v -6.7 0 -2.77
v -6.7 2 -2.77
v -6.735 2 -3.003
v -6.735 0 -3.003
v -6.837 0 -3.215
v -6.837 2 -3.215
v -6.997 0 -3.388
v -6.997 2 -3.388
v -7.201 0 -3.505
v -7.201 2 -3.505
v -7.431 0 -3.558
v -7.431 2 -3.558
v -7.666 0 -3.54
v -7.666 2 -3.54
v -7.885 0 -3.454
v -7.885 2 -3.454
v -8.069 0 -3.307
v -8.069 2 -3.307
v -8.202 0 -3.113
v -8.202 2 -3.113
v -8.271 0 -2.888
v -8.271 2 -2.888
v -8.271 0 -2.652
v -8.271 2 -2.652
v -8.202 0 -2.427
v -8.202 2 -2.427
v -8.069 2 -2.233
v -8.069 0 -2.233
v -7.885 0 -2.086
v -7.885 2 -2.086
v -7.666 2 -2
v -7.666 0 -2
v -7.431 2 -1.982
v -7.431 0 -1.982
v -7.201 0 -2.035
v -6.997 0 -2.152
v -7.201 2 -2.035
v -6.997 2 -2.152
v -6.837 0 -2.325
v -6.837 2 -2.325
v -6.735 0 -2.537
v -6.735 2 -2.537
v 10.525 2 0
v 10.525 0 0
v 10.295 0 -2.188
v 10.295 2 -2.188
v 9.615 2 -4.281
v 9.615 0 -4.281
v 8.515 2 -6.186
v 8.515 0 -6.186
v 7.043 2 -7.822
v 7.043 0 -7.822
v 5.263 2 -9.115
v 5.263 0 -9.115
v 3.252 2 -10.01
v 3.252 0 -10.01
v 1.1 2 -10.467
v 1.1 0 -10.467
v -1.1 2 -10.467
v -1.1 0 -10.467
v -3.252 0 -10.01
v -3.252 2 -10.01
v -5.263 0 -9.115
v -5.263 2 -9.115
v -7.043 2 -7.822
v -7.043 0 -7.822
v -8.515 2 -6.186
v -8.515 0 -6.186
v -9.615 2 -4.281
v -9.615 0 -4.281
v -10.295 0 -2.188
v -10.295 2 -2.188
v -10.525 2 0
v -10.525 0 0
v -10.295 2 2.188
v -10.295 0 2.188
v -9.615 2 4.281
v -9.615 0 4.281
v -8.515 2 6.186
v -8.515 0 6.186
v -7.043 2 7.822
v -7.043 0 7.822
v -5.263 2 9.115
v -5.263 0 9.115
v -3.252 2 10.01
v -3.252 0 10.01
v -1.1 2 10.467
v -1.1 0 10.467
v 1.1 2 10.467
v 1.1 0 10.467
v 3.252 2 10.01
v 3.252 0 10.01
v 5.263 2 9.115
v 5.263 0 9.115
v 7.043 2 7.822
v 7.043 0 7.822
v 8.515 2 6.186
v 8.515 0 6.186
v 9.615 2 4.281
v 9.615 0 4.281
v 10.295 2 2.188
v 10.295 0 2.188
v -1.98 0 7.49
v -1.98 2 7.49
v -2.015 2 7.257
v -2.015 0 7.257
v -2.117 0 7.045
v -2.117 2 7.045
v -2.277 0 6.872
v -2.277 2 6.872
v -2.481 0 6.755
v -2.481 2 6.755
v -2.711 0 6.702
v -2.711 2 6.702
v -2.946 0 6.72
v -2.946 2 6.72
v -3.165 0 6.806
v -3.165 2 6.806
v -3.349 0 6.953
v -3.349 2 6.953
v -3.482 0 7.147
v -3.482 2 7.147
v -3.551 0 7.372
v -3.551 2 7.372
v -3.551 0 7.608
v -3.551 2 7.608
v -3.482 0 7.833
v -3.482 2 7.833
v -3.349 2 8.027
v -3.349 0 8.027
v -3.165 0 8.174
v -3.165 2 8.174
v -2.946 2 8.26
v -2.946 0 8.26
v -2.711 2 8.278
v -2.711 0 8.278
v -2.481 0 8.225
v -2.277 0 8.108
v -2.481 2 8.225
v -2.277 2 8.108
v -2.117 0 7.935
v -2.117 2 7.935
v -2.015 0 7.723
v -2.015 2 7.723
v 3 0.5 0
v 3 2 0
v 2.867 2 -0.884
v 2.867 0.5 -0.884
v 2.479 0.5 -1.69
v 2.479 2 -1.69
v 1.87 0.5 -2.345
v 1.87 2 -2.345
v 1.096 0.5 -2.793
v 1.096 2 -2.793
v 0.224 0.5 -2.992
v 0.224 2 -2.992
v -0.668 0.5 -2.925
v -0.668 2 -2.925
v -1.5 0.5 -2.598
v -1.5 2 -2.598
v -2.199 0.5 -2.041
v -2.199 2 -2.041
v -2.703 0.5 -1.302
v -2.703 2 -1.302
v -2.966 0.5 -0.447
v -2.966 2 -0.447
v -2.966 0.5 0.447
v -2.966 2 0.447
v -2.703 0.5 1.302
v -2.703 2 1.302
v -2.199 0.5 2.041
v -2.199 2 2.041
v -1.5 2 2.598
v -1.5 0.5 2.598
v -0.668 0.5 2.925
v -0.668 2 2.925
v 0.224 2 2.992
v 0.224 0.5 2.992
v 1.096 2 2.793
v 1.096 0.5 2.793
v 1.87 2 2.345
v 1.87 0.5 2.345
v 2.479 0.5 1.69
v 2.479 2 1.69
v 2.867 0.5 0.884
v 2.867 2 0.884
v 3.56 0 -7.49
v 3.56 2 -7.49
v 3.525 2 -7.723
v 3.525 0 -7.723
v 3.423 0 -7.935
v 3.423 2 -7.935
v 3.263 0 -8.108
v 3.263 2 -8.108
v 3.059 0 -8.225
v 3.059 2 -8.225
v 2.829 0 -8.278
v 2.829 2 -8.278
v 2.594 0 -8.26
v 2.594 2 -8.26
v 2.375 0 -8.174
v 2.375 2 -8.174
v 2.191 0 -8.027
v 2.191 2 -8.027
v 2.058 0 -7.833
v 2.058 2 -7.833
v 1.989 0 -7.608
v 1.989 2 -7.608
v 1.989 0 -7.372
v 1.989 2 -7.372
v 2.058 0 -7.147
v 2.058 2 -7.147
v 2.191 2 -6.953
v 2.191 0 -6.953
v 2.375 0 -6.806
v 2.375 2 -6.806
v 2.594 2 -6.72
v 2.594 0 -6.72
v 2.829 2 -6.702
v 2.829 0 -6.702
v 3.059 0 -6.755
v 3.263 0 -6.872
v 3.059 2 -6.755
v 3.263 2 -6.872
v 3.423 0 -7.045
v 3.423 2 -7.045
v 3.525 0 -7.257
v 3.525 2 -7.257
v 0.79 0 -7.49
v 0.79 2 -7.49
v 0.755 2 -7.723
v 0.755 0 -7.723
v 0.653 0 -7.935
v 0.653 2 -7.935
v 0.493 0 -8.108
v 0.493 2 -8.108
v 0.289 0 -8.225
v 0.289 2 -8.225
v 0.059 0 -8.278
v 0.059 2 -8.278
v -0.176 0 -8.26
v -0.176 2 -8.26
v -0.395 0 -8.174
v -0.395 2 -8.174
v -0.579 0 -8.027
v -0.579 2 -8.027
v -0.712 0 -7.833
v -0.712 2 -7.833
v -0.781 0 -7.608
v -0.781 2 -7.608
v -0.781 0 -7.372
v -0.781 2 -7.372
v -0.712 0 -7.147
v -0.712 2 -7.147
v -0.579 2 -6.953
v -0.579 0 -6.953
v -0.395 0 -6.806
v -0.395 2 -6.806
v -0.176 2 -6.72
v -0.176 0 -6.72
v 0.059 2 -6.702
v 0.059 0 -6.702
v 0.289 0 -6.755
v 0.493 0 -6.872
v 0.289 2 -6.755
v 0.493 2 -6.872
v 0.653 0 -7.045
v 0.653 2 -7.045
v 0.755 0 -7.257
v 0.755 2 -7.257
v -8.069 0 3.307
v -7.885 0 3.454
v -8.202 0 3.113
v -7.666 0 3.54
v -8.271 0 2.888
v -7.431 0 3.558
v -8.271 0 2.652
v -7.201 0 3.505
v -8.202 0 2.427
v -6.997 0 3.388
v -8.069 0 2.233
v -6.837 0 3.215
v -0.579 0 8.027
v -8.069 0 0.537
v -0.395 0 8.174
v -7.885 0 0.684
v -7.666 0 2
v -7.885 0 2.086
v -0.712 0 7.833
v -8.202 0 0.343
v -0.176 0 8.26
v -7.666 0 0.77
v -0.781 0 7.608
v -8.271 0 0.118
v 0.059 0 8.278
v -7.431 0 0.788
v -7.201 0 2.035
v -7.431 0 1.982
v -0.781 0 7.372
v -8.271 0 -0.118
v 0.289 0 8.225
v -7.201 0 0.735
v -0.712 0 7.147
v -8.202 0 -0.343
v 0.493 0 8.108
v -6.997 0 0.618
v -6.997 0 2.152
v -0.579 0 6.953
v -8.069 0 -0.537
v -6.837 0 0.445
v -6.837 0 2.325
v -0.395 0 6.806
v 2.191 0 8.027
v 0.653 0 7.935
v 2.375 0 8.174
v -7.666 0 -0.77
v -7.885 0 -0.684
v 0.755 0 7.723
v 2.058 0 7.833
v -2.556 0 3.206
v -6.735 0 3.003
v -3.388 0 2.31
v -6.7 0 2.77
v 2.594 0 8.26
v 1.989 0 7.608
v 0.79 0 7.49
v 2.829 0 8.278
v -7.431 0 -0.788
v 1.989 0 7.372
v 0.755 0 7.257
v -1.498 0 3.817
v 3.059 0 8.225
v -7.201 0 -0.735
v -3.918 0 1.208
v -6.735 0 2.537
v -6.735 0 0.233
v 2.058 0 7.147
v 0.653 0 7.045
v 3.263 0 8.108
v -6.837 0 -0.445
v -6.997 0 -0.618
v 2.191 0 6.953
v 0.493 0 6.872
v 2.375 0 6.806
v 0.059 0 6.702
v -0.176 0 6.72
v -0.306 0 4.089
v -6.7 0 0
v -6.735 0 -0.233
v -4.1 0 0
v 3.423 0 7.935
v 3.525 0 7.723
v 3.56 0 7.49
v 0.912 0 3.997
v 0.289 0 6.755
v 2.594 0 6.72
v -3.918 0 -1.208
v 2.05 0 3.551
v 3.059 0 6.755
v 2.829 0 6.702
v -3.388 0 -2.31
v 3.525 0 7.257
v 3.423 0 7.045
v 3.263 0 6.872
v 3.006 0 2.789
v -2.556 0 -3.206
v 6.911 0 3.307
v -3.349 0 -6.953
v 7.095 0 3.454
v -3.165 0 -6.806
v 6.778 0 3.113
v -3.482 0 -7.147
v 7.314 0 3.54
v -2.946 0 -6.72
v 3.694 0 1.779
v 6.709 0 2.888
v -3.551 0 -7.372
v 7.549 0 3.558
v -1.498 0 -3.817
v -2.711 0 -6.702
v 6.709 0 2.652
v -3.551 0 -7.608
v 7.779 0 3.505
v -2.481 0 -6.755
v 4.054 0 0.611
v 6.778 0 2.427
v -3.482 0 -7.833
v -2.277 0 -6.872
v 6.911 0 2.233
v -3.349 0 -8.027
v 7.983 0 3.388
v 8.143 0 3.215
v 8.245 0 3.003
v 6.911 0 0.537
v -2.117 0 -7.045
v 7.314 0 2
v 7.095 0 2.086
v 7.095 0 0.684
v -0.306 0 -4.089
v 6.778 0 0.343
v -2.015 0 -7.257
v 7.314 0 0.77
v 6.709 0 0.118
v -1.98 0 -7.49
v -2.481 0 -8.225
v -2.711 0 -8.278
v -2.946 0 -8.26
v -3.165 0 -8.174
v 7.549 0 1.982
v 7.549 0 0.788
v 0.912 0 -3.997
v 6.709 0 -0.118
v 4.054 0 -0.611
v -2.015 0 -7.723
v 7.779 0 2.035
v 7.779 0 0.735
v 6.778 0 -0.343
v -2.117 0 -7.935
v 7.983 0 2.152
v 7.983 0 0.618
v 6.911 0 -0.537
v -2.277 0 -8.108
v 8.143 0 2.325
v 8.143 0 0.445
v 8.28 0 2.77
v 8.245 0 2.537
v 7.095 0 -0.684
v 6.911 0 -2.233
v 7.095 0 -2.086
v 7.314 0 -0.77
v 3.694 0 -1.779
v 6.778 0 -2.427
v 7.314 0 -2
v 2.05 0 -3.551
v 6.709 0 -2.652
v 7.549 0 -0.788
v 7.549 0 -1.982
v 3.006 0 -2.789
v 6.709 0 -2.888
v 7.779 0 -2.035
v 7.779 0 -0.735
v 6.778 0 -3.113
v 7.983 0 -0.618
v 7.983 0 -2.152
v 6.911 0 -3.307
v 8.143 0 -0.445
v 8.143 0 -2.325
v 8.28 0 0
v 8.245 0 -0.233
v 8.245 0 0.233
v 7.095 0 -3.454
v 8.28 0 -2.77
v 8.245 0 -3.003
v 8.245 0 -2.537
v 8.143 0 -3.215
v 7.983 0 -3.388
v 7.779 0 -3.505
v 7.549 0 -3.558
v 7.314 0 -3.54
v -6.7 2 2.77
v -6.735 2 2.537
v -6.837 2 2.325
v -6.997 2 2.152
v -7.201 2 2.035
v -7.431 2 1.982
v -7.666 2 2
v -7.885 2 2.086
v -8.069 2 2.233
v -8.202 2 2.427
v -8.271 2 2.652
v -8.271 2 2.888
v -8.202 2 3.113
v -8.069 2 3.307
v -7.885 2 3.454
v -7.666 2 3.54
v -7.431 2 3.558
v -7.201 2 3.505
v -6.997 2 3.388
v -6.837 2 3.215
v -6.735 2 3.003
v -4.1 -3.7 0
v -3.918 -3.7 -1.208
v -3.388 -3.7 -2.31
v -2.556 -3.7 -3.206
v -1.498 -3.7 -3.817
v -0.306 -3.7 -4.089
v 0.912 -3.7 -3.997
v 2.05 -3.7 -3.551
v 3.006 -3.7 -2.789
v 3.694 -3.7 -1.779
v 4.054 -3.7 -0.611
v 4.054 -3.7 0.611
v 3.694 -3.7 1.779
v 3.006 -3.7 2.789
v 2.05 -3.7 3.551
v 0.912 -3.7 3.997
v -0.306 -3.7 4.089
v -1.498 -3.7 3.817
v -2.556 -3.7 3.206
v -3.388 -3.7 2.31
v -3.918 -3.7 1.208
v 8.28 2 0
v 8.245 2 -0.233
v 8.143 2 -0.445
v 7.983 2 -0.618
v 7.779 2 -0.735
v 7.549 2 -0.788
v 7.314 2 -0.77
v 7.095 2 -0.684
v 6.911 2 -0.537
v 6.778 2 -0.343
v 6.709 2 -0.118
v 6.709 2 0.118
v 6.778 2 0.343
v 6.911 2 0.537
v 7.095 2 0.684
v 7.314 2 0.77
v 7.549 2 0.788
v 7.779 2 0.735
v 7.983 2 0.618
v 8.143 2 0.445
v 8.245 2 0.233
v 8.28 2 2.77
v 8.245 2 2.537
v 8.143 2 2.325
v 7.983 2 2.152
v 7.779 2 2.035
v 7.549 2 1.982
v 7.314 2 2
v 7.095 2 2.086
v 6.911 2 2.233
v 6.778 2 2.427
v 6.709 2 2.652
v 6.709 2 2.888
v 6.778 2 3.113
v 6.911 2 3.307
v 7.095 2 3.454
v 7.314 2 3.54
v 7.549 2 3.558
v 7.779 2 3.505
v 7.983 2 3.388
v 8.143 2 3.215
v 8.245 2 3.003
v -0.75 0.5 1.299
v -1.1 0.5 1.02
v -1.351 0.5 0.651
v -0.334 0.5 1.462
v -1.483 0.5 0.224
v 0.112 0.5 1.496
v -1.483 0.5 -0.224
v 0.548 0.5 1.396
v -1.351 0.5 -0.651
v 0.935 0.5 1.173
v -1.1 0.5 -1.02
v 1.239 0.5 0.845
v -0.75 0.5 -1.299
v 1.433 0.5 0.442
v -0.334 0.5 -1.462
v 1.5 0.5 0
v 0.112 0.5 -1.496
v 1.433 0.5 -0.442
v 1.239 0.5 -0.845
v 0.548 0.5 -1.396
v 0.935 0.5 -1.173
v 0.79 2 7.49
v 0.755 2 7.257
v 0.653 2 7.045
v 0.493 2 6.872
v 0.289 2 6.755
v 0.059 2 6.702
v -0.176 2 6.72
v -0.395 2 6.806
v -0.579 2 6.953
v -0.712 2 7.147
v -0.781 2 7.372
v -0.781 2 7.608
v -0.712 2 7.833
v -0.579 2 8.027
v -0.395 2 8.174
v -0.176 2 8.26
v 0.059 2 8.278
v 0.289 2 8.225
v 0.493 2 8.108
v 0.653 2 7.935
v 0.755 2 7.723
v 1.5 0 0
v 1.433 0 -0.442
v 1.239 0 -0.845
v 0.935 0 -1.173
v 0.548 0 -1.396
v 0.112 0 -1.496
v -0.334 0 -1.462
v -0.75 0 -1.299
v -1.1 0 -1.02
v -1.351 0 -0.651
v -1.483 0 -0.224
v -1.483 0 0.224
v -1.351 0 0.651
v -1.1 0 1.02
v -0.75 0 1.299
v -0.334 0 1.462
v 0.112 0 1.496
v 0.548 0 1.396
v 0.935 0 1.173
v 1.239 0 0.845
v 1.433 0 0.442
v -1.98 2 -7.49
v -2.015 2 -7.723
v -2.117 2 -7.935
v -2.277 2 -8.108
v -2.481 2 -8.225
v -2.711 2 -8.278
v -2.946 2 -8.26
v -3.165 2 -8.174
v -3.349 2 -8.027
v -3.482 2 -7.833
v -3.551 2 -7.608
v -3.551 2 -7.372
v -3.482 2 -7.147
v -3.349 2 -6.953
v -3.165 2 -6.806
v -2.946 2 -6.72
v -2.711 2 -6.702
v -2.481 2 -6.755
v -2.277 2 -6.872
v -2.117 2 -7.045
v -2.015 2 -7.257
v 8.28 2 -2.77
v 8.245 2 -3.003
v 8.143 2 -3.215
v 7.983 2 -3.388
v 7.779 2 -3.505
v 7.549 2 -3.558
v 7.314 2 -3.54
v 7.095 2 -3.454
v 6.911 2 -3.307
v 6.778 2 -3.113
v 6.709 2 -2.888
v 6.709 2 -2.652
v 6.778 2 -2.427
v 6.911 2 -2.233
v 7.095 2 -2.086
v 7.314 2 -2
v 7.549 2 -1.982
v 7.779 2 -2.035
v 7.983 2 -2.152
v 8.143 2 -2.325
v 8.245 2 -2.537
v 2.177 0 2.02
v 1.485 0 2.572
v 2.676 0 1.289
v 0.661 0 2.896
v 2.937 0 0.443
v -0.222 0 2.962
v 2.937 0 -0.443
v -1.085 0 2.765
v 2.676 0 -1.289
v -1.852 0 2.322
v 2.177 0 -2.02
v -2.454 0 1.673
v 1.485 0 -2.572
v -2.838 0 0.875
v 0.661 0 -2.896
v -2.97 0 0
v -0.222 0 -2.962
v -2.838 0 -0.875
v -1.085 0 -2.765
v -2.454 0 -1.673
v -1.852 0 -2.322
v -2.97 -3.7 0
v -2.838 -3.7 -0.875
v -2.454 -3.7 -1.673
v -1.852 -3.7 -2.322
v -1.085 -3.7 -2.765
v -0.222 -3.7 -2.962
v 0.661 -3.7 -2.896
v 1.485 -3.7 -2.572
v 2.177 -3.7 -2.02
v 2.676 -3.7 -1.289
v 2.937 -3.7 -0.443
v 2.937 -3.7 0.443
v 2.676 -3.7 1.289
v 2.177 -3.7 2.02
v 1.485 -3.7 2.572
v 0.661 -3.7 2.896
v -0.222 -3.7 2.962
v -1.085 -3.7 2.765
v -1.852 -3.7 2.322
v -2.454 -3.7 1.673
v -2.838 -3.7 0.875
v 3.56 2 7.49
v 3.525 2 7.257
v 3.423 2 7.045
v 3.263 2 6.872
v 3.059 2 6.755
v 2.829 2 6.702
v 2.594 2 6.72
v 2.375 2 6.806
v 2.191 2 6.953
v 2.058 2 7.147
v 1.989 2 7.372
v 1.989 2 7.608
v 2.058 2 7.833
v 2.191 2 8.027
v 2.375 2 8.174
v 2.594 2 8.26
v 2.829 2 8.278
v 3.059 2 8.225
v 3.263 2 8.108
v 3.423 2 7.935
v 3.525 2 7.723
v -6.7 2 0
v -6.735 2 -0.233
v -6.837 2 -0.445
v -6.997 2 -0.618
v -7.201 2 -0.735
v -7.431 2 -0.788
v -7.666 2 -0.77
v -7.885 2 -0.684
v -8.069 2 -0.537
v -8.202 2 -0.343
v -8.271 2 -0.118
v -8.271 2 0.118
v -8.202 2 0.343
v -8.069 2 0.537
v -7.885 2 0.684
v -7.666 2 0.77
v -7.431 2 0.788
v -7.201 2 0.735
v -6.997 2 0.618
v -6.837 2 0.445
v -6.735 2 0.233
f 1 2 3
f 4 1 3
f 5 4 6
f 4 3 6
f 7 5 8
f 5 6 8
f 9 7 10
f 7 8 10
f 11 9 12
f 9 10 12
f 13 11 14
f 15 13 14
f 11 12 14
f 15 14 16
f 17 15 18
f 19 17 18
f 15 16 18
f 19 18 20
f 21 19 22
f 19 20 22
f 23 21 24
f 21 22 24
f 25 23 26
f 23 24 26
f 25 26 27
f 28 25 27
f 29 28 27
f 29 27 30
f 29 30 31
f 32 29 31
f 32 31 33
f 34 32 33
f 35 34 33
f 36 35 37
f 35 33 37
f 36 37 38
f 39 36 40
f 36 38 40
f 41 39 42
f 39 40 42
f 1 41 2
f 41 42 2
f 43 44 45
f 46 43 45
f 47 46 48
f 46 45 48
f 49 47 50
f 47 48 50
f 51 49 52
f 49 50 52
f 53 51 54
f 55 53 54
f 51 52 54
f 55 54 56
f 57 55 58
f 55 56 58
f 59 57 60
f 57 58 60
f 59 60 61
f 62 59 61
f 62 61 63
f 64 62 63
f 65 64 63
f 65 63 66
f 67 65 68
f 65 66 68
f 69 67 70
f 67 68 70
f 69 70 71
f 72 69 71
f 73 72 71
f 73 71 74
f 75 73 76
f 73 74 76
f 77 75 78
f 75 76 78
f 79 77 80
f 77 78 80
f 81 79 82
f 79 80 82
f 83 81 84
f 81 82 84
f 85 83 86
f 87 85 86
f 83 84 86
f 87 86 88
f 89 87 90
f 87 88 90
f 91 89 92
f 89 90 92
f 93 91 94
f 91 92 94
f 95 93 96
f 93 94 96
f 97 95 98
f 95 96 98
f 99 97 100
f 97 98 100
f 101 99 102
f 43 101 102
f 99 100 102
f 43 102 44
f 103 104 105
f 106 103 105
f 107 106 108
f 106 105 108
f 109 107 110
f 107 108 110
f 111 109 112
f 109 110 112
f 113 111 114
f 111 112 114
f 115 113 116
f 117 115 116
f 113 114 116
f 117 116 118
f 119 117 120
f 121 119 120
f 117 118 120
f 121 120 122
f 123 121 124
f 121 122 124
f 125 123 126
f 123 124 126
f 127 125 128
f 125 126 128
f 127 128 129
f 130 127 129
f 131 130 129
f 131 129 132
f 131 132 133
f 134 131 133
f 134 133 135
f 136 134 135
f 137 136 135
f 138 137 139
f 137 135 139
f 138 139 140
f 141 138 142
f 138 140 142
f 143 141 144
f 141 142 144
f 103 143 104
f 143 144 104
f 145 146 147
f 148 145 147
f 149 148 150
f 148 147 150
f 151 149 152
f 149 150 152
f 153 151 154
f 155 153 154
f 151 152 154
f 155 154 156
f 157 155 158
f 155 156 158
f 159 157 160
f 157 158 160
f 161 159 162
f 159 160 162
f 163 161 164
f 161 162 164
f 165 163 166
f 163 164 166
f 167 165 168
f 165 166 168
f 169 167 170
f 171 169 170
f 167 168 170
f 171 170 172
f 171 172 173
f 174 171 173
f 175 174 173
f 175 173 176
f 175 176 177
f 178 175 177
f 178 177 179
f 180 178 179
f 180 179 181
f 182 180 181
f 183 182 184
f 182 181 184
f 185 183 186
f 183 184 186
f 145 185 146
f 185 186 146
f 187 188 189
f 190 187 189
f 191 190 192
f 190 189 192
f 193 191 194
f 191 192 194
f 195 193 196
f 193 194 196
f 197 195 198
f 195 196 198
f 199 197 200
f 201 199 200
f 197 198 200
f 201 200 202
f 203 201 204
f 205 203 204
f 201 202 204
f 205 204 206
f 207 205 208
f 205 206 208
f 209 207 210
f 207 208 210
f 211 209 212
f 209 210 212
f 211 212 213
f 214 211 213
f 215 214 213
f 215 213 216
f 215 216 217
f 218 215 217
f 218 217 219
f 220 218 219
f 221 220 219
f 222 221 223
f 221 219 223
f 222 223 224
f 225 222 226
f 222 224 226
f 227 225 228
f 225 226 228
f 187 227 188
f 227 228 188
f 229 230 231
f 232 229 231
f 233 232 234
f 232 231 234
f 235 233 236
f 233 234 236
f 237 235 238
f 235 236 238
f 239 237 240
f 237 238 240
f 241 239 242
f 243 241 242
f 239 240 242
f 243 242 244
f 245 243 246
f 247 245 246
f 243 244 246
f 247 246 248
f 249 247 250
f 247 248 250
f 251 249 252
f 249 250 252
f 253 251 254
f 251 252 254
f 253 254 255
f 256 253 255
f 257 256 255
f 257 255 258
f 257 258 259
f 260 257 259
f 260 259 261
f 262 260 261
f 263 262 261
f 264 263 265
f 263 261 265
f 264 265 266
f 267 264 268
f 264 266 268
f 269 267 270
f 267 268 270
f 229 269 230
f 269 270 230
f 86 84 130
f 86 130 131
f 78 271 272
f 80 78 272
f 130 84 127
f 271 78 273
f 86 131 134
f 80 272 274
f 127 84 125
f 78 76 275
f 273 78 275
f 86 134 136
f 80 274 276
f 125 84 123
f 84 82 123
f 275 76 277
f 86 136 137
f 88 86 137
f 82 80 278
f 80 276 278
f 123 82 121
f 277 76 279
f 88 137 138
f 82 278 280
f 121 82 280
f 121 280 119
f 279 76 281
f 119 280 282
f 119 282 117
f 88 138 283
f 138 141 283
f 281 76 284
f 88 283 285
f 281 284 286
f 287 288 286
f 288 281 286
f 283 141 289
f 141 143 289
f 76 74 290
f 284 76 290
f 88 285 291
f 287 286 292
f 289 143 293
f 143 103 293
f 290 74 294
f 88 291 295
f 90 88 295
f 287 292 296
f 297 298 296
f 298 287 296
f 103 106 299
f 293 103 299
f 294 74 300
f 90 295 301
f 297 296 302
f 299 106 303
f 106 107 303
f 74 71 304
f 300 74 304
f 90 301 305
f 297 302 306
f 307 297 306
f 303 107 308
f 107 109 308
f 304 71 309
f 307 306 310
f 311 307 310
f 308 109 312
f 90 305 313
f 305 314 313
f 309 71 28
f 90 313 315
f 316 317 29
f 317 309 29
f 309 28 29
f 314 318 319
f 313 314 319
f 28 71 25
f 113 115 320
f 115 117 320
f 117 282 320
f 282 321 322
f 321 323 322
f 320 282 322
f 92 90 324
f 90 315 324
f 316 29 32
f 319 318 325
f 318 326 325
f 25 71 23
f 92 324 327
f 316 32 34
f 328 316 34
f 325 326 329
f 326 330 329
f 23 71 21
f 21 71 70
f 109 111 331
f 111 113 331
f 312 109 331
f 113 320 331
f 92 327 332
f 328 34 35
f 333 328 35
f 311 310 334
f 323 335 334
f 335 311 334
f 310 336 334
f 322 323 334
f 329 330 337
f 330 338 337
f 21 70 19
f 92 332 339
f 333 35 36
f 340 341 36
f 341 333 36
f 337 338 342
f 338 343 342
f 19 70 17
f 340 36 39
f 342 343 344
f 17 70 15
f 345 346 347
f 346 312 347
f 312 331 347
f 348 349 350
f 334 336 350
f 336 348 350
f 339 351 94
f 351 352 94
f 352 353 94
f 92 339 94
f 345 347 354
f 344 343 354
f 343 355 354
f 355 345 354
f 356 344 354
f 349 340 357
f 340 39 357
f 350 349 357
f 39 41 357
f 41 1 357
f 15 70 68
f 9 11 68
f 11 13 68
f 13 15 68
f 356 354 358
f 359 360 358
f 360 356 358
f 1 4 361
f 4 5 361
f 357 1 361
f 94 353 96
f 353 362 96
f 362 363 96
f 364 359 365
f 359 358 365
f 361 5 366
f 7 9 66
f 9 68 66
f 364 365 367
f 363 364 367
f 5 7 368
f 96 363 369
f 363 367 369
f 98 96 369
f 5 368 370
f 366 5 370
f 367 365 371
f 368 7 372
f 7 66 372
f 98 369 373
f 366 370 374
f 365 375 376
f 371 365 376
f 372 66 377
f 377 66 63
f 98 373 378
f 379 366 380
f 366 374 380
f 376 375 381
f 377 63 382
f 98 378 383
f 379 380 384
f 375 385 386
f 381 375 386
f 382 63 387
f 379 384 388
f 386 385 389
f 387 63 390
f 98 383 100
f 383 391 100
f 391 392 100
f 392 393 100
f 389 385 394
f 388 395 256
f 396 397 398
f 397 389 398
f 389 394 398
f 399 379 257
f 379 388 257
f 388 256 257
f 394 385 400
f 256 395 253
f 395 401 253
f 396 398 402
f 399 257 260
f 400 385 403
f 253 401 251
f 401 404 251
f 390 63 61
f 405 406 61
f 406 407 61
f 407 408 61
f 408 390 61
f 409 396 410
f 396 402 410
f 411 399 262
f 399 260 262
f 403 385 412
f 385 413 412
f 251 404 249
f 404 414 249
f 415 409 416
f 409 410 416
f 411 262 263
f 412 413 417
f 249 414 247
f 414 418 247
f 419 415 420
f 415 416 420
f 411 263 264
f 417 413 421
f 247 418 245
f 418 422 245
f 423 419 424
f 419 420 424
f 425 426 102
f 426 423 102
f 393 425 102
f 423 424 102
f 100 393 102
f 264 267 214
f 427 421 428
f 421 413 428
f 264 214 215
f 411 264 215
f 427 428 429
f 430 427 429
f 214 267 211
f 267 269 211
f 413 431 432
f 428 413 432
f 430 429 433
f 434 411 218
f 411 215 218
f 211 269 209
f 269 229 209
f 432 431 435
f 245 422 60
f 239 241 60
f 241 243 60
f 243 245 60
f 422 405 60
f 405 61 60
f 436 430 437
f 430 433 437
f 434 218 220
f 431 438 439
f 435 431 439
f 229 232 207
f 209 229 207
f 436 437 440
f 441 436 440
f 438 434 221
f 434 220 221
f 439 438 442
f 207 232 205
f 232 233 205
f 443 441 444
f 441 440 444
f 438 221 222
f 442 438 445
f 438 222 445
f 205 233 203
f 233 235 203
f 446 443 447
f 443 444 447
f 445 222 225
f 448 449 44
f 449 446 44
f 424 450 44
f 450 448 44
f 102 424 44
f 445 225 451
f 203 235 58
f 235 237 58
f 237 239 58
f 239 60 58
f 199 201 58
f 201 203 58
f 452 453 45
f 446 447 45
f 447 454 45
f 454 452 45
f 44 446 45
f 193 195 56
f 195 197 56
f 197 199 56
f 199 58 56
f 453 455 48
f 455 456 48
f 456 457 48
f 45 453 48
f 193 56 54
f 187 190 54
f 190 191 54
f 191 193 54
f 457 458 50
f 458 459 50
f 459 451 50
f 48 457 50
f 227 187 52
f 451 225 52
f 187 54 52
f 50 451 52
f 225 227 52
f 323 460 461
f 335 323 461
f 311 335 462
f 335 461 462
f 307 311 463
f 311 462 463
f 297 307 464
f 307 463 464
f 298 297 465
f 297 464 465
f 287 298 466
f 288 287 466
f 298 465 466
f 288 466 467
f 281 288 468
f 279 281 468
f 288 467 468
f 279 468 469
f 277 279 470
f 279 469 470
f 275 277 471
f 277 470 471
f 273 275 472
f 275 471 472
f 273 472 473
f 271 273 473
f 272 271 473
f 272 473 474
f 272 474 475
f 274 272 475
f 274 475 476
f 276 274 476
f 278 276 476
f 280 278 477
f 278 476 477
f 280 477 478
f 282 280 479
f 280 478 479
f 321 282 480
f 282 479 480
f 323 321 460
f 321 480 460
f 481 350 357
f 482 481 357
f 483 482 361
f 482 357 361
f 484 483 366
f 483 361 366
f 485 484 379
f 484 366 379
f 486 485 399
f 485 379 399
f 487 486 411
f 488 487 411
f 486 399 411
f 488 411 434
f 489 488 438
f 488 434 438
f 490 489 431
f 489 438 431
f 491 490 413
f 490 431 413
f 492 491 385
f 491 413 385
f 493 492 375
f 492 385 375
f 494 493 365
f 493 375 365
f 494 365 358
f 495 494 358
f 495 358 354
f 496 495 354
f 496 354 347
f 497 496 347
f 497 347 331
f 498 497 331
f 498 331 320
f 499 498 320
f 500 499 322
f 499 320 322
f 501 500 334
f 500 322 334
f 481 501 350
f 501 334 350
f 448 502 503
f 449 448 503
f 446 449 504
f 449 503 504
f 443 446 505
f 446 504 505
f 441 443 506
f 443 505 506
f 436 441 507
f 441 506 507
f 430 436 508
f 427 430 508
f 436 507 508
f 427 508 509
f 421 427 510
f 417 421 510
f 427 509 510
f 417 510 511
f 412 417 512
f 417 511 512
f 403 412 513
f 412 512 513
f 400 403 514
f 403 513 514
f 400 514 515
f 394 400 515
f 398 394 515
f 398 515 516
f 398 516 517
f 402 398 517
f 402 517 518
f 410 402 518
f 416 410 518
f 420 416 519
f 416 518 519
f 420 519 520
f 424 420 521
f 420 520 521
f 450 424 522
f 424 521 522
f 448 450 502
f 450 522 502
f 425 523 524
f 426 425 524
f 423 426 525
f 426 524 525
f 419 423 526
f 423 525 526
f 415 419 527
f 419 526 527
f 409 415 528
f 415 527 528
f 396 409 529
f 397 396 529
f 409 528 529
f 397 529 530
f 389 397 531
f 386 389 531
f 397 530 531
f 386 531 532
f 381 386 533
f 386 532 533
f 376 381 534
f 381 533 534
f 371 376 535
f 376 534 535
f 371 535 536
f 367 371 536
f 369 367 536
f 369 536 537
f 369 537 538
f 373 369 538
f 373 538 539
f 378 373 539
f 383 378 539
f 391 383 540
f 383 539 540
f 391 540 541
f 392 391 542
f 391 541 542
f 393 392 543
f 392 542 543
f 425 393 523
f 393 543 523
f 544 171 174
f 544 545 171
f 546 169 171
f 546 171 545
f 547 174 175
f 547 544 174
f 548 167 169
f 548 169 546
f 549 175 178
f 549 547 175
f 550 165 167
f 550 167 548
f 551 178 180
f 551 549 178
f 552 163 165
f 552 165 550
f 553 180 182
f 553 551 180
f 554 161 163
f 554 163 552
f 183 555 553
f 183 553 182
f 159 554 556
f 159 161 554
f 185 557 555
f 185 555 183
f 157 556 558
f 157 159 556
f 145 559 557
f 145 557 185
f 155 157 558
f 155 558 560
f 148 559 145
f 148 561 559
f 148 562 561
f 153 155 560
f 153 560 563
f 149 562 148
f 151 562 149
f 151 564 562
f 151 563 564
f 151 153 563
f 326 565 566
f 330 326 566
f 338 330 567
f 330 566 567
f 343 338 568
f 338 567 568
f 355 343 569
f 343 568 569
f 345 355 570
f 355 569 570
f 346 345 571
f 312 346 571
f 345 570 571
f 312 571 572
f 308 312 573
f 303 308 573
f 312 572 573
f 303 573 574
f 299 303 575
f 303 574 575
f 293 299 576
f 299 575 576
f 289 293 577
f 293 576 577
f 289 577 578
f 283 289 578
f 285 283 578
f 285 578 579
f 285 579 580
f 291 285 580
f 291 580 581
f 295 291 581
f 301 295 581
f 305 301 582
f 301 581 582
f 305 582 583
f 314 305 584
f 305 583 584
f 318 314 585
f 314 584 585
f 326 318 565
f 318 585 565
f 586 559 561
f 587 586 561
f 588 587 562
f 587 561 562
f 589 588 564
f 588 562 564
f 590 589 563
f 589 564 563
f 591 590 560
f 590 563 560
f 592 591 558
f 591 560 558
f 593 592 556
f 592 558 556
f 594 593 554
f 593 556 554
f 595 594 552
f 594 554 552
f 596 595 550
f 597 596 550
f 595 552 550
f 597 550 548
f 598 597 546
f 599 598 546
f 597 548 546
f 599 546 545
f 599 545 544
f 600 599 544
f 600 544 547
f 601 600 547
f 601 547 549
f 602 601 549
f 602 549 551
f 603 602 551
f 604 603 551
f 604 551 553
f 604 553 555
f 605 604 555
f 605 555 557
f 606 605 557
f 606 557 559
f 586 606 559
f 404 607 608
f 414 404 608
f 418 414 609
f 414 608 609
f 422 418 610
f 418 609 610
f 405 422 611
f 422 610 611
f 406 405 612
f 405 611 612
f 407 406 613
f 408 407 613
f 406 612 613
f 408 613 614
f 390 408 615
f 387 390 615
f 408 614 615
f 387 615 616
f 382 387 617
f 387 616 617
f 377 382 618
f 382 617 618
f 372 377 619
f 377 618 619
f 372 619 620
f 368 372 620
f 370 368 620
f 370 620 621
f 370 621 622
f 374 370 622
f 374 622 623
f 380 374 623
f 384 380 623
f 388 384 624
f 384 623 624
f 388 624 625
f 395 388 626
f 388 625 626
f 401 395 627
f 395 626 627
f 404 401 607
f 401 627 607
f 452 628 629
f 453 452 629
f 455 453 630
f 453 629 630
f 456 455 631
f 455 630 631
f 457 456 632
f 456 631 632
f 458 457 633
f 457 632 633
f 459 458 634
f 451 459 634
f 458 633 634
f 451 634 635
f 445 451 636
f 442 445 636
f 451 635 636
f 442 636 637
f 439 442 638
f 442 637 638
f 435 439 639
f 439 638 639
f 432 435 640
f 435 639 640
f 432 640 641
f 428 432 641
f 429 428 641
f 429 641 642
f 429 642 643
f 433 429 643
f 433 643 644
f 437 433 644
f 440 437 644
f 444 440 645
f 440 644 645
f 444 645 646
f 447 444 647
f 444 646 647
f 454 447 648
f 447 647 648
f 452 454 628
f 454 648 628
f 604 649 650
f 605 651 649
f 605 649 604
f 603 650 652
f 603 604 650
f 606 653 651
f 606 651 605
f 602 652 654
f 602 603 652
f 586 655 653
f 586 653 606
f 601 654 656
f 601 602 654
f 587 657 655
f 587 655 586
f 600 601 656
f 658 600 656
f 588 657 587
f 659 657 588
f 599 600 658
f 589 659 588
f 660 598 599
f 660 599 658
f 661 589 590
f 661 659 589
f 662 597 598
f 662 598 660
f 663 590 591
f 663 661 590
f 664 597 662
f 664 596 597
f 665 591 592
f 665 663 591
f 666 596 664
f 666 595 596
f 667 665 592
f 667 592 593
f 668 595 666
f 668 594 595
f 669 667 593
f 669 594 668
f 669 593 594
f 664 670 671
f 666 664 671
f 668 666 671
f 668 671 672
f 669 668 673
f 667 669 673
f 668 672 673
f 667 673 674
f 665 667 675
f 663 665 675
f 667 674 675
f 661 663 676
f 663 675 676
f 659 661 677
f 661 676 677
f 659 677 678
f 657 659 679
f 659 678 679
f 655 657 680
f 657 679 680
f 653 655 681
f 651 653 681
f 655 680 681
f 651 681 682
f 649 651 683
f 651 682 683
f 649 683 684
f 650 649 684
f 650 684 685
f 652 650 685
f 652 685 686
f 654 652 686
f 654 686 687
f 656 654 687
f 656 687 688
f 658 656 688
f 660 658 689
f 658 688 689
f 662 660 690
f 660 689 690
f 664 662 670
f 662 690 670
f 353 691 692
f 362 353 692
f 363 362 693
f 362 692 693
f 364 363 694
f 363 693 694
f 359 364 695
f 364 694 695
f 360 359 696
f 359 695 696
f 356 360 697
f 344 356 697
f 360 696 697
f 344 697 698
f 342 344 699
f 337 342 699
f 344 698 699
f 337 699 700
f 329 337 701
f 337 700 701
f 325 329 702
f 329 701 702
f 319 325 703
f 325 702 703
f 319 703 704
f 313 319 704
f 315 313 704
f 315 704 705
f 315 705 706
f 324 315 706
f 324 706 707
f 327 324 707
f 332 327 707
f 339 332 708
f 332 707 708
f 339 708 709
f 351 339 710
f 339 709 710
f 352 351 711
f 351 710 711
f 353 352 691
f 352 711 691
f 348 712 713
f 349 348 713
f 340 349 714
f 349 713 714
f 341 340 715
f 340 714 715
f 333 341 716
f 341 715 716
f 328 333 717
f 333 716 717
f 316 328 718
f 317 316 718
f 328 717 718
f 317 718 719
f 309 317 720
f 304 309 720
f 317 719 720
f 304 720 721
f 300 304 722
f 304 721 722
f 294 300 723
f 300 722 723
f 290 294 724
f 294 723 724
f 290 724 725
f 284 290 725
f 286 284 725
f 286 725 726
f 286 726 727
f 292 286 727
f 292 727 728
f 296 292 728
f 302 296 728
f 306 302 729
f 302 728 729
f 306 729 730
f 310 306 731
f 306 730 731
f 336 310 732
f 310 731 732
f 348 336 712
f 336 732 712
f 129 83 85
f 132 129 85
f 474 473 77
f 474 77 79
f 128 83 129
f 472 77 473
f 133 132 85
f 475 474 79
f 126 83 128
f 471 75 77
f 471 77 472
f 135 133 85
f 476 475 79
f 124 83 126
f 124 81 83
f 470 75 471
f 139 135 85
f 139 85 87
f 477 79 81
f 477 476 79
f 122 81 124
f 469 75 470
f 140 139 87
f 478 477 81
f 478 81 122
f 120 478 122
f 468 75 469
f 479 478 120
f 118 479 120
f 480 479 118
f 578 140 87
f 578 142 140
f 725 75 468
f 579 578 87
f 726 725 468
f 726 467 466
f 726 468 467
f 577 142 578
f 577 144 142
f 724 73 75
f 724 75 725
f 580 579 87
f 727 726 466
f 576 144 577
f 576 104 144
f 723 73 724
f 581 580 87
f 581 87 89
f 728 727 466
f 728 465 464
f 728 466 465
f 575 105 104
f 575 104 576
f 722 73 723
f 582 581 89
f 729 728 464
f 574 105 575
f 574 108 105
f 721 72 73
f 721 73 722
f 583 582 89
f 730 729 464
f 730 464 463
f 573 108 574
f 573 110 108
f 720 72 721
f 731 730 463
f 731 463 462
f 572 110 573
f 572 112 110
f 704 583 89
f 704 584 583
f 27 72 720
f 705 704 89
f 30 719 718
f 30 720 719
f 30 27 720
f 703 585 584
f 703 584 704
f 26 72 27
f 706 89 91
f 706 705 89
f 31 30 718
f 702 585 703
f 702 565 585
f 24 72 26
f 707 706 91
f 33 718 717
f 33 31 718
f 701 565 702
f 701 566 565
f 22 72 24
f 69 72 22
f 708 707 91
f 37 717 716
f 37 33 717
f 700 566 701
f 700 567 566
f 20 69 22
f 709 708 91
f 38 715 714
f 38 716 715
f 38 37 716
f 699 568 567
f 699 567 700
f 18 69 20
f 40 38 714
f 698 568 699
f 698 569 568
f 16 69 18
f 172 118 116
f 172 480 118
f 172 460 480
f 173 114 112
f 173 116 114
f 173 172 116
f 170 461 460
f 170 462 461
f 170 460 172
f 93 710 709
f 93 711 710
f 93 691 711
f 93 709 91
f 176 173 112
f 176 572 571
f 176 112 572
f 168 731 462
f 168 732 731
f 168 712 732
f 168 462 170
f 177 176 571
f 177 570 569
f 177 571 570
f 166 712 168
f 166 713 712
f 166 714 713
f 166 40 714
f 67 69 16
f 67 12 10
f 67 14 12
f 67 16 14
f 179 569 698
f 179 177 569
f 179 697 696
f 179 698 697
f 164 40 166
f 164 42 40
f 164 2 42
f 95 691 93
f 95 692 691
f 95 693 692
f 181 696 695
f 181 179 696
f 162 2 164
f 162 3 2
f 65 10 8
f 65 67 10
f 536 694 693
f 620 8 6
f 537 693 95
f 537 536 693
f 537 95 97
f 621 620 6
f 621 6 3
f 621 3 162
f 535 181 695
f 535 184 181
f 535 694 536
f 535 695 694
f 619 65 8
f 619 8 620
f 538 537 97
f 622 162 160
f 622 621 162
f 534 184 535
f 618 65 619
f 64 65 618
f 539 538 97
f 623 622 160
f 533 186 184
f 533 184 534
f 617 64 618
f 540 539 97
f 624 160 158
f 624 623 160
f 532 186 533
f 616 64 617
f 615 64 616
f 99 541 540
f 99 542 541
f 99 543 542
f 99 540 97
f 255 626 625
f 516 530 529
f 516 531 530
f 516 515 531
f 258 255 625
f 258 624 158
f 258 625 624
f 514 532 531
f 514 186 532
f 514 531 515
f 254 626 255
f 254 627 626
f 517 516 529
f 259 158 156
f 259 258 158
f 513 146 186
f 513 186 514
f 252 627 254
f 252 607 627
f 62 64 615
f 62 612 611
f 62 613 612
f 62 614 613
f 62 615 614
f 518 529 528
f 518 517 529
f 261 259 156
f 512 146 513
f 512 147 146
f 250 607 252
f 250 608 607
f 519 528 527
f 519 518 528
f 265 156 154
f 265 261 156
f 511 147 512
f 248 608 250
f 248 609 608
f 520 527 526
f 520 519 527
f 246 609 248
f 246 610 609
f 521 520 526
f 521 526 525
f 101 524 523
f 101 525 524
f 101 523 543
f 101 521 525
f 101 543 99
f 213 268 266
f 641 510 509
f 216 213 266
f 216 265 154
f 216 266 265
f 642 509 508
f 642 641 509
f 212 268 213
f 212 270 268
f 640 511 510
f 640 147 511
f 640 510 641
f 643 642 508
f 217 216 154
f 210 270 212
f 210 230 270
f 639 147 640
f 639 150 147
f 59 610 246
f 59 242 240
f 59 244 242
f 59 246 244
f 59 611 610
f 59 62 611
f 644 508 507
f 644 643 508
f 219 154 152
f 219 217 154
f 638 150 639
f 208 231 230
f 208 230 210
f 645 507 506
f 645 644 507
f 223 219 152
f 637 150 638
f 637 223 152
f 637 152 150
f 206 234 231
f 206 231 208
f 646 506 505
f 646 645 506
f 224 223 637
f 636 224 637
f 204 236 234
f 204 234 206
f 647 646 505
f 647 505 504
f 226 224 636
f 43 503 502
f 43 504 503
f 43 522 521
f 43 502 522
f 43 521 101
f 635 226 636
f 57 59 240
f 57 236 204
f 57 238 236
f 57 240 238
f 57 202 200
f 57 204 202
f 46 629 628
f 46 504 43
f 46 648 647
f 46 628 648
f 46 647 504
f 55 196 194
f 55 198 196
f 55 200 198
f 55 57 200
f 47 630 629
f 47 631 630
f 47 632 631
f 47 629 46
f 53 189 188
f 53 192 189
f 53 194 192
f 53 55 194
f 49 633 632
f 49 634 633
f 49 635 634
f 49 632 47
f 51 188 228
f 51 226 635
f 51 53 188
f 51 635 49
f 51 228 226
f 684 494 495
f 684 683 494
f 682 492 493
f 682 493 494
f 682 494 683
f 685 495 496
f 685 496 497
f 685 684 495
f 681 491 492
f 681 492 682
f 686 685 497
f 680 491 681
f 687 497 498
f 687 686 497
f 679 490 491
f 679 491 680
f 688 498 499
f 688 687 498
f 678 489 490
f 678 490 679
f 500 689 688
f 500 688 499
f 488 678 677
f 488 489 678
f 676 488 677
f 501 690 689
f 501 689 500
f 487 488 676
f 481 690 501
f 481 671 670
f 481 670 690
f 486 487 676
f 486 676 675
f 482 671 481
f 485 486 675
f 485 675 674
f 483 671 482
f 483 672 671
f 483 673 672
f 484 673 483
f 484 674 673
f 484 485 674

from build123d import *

# Parameters (mm, degrees)
SKETCH_1_R           = 10.525
EXTRUDE_1_DEPTH      = 2
SKETCH_2_R           = 4.1
EXTRUDE_2_DEPTH      = 3.7
SKETCH_3_R           = 2.97
CUT_EXTRUDE_1_DEPTH  = 3.7
SKETCH_4_R           = 1.5
CUT_EXTRUDE_2_DEPTH  = 2
SKETCH_5_R           = 3
CUT_EXTRUDE_3_DEPTH  = 1.5
SKETCH_6_R           = 0.79
CUT_EXTRUDE_4_DEPTH  = 2
SKETCH_7_R           = 0.79
CUT_EXTRUDE_5_DEPTH  = 2
SKETCH_8_R           = 0.79
CUT_EXTRUDE_6_DEPTH  = 2
SKETCH_9_R           = 0.79
CUT_EXTRUDE_7_DEPTH  = 2
SKETCH_10_R          = 0.79
CUT_EXTRUDE_8_DEPTH  = 2
SKETCH_11_R          = 0.79
CUT_EXTRUDE_9_DEPTH  = 2
SKETCH_12_R          = 0.79
CUT_EXTRUDE_10_DEPTH = 2
SKETCH_13_R          = 0.79
CUT_EXTRUDE_11_DEPTH = 2
SKETCH_14_R          = 0.79
CUT_EXTRUDE_12_DEPTH = 2
SKETCH_15_R          = 0.79
CUT_EXTRUDE_13_DEPTH = 2
SKETCH_16_R          = 0.79
CUT_EXTRUDE_14_DEPTH = 2
SKETCH_17_R          = 0.79
CUT_EXTRUDE_15_DEPTH = 2


with BuildPart() as part:
    # ｽｹｯﾁ1 → ﾎﾞｽ - 押し出し1 (new body)
    with BuildSketch(Plane(origin=(0, 0, 0), x_dir=(1, 0, 0), z_dir=(0, 1, 0))):
        Circle(SKETCH_1_R)
    extrude(amount=EXTRUDE_1_DEPTH)

    # ｽｹｯﾁ2 → ﾎﾞｽ - 押し出し2 (add)
    with BuildSketch(Plane(origin=(0, 0, 0), x_dir=(-1, 0, 0), z_dir=(0, -1, 0))):
        Circle(SKETCH_2_R)
    extrude(amount=EXTRUDE_2_DEPTH)

    # ｽｹｯﾁ3 → ｶｯﾄ - 押し出し1 (cut)
    with BuildSketch(Plane(origin=(0, -3.7, 0), x_dir=(-1, 0, 0), z_dir=(0, -1, 0))):
        Circle(SKETCH_3_R)
    extrude(amount=-CUT_EXTRUDE_1_DEPTH, mode=Mode.SUBTRACT)

    # ｽｹｯﾁ4 → ｶｯﾄ - 押し出し2 (cut)
    with BuildSketch(Plane(origin=(0, 2, 0), x_dir=(1, 0, 0), z_dir=(0, 1, 0))):
        Circle(SKETCH_4_R)
    extrude(amount=-CUT_EXTRUDE_2_DEPTH, mode=Mode.SUBTRACT)

    # ｽｹｯﾁ5 → ｶｯﾄ - 押し出し3 (cut)
    with BuildSketch(Plane(origin=(0, 2, 0), x_dir=(1, 0, 0), z_dir=(0, 1, 0))):
        Circle(SKETCH_5_R)
    extrude(amount=-CUT_EXTRUDE_3_DEPTH, mode=Mode.SUBTRACT)

    # ｽｹｯﾁ6 → ｶｯﾄ - 押し出し4 (cut)
    with BuildSketch(Plane(origin=(0, 2, 0), x_dir=(1, 0, 0), z_dir=(0, 1, 0))):
        with Locations((0, 7.49)):
            Circle(SKETCH_6_R)
    extrude(amount=-CUT_EXTRUDE_4_DEPTH, mode=Mode.SUBTRACT)

    # ｽｹｯﾁ7 → ｶｯﾄ - 押し出し5 (cut)
    with BuildSketch(Plane(origin=(0, 2, 0), x_dir=(1, 0, 0), z_dir=(0, 1, 0))):
        with Locations((2.77, 7.49)):
            Circle(SKETCH_7_R)
    extrude(amount=-CUT_EXTRUDE_5_DEPTH, mode=Mode.SUBTRACT)

    # ｽｹｯﾁ8 → ｶｯﾄ - 押し出し6 (cut)
    with BuildSketch(Plane(origin=(0, 2, 0), x_dir=(1, 0, 0), z_dir=(0, 1, 0))):
        with Locations((-2.77, 7.49)):
            Circle(SKETCH_8_R)
    extrude(amount=-CUT_EXTRUDE_6_DEPTH, mode=Mode.SUBTRACT)

    # ｽｹｯﾁ9 → ｶｯﾄ - 押し出し7 (cut)
    with BuildSketch(Plane(origin=(0, 2, 0), x_dir=(1, 0, 0), z_dir=(0, 1, 0))):
        with Locations((7.49, 0)):
            Circle(SKETCH_9_R)
    extrude(amount=-CUT_EXTRUDE_7_DEPTH, mode=Mode.SUBTRACT)

    # ｽｹｯﾁ10 → ｶｯﾄ - 押し出し8 (cut)
    with BuildSketch(Plane(origin=(0, 2, 0), x_dir=(1, 0, 0), z_dir=(0, 1, 0))):
        with Locations((7.49, -2.77)):
            Circle(SKETCH_10_R)
    extrude(amount=-CUT_EXTRUDE_8_DEPTH, mode=Mode.SUBTRACT)

    # ｽｹｯﾁ11 → ｶｯﾄ - 押し出し9 (cut)
    with BuildSketch(Plane(origin=(0, 2, 0), x_dir=(1, 0, 0), z_dir=(0, 1, 0))):
        with Locations((7.49, 2.77)):
            Circle(SKETCH_11_R)
    extrude(amount=-CUT_EXTRUDE_9_DEPTH, mode=Mode.SUBTRACT)

    # ｽｹｯﾁ12 → ｶｯﾄ - 押し出し10 (cut)
    with BuildSketch(Plane(origin=(0, 2, 0), x_dir=(1, 0, 0), z_dir=(0, 1, 0))):
        with Locations((0, -7.49)):
            Circle(SKETCH_12_R)
    extrude(amount=-CUT_EXTRUDE_10_DEPTH, mode=Mode.SUBTRACT)

    # ｽｹｯﾁ13 → ｶｯﾄ - 押し出し11 (cut)
    with BuildSketch(Plane(origin=(0, 2, 0), x_dir=(1, 0, 0), z_dir=(0, 1, 0))):
        with Locations((2.77, -7.49)):
            Circle(SKETCH_13_R)
    extrude(amount=-CUT_EXTRUDE_11_DEPTH, mode=Mode.SUBTRACT)

    # ｽｹｯﾁ14 → ｶｯﾄ - 押し出し12 (cut)
    with BuildSketch(Plane(origin=(0, 2, 0), x_dir=(1, 0, 0), z_dir=(0, 1, 0))):
        with Locations((-2.77, -7.49)):
            Circle(SKETCH_14_R)
    extrude(amount=-CUT_EXTRUDE_12_DEPTH, mode=Mode.SUBTRACT)

    # ｽｹｯﾁ15 → ｶｯﾄ - 押し出し13 (cut)
    with BuildSketch(Plane(origin=(0, 2, 0), x_dir=(1, 0, 0), z_dir=(0, 1, 0))):
        with Locations((-7.49, 0)):
            Circle(SKETCH_15_R)
    extrude(amount=-CUT_EXTRUDE_13_DEPTH, mode=Mode.SUBTRACT)

    # ｽｹｯﾁ16 → ｶｯﾄ - 押し出し14 (cut)
    with BuildSketch(Plane(origin=(0, 2, 0), x_dir=(1, 0, 0), z_dir=(0, 1, 0))):
        with Locations((-7.49, 2.77)):
            Circle(SKETCH_16_R)
    extrude(amount=-CUT_EXTRUDE_14_DEPTH, mode=Mode.SUBTRACT)

    # ｽｹｯﾁ17 → ｶｯﾄ - 押し出し15 (cut)
    with BuildSketch(Plane(origin=(0, 2, 0), x_dir=(1, 0, 0), z_dir=(0, 1, 0))):
        with Locations((-7.49, -2.77)):
            Circle(SKETCH_17_R)
    extrude(amount=-CUT_EXTRUDE_15_DEPTH, mode=Mode.SUBTRACT)


solid = part.part
